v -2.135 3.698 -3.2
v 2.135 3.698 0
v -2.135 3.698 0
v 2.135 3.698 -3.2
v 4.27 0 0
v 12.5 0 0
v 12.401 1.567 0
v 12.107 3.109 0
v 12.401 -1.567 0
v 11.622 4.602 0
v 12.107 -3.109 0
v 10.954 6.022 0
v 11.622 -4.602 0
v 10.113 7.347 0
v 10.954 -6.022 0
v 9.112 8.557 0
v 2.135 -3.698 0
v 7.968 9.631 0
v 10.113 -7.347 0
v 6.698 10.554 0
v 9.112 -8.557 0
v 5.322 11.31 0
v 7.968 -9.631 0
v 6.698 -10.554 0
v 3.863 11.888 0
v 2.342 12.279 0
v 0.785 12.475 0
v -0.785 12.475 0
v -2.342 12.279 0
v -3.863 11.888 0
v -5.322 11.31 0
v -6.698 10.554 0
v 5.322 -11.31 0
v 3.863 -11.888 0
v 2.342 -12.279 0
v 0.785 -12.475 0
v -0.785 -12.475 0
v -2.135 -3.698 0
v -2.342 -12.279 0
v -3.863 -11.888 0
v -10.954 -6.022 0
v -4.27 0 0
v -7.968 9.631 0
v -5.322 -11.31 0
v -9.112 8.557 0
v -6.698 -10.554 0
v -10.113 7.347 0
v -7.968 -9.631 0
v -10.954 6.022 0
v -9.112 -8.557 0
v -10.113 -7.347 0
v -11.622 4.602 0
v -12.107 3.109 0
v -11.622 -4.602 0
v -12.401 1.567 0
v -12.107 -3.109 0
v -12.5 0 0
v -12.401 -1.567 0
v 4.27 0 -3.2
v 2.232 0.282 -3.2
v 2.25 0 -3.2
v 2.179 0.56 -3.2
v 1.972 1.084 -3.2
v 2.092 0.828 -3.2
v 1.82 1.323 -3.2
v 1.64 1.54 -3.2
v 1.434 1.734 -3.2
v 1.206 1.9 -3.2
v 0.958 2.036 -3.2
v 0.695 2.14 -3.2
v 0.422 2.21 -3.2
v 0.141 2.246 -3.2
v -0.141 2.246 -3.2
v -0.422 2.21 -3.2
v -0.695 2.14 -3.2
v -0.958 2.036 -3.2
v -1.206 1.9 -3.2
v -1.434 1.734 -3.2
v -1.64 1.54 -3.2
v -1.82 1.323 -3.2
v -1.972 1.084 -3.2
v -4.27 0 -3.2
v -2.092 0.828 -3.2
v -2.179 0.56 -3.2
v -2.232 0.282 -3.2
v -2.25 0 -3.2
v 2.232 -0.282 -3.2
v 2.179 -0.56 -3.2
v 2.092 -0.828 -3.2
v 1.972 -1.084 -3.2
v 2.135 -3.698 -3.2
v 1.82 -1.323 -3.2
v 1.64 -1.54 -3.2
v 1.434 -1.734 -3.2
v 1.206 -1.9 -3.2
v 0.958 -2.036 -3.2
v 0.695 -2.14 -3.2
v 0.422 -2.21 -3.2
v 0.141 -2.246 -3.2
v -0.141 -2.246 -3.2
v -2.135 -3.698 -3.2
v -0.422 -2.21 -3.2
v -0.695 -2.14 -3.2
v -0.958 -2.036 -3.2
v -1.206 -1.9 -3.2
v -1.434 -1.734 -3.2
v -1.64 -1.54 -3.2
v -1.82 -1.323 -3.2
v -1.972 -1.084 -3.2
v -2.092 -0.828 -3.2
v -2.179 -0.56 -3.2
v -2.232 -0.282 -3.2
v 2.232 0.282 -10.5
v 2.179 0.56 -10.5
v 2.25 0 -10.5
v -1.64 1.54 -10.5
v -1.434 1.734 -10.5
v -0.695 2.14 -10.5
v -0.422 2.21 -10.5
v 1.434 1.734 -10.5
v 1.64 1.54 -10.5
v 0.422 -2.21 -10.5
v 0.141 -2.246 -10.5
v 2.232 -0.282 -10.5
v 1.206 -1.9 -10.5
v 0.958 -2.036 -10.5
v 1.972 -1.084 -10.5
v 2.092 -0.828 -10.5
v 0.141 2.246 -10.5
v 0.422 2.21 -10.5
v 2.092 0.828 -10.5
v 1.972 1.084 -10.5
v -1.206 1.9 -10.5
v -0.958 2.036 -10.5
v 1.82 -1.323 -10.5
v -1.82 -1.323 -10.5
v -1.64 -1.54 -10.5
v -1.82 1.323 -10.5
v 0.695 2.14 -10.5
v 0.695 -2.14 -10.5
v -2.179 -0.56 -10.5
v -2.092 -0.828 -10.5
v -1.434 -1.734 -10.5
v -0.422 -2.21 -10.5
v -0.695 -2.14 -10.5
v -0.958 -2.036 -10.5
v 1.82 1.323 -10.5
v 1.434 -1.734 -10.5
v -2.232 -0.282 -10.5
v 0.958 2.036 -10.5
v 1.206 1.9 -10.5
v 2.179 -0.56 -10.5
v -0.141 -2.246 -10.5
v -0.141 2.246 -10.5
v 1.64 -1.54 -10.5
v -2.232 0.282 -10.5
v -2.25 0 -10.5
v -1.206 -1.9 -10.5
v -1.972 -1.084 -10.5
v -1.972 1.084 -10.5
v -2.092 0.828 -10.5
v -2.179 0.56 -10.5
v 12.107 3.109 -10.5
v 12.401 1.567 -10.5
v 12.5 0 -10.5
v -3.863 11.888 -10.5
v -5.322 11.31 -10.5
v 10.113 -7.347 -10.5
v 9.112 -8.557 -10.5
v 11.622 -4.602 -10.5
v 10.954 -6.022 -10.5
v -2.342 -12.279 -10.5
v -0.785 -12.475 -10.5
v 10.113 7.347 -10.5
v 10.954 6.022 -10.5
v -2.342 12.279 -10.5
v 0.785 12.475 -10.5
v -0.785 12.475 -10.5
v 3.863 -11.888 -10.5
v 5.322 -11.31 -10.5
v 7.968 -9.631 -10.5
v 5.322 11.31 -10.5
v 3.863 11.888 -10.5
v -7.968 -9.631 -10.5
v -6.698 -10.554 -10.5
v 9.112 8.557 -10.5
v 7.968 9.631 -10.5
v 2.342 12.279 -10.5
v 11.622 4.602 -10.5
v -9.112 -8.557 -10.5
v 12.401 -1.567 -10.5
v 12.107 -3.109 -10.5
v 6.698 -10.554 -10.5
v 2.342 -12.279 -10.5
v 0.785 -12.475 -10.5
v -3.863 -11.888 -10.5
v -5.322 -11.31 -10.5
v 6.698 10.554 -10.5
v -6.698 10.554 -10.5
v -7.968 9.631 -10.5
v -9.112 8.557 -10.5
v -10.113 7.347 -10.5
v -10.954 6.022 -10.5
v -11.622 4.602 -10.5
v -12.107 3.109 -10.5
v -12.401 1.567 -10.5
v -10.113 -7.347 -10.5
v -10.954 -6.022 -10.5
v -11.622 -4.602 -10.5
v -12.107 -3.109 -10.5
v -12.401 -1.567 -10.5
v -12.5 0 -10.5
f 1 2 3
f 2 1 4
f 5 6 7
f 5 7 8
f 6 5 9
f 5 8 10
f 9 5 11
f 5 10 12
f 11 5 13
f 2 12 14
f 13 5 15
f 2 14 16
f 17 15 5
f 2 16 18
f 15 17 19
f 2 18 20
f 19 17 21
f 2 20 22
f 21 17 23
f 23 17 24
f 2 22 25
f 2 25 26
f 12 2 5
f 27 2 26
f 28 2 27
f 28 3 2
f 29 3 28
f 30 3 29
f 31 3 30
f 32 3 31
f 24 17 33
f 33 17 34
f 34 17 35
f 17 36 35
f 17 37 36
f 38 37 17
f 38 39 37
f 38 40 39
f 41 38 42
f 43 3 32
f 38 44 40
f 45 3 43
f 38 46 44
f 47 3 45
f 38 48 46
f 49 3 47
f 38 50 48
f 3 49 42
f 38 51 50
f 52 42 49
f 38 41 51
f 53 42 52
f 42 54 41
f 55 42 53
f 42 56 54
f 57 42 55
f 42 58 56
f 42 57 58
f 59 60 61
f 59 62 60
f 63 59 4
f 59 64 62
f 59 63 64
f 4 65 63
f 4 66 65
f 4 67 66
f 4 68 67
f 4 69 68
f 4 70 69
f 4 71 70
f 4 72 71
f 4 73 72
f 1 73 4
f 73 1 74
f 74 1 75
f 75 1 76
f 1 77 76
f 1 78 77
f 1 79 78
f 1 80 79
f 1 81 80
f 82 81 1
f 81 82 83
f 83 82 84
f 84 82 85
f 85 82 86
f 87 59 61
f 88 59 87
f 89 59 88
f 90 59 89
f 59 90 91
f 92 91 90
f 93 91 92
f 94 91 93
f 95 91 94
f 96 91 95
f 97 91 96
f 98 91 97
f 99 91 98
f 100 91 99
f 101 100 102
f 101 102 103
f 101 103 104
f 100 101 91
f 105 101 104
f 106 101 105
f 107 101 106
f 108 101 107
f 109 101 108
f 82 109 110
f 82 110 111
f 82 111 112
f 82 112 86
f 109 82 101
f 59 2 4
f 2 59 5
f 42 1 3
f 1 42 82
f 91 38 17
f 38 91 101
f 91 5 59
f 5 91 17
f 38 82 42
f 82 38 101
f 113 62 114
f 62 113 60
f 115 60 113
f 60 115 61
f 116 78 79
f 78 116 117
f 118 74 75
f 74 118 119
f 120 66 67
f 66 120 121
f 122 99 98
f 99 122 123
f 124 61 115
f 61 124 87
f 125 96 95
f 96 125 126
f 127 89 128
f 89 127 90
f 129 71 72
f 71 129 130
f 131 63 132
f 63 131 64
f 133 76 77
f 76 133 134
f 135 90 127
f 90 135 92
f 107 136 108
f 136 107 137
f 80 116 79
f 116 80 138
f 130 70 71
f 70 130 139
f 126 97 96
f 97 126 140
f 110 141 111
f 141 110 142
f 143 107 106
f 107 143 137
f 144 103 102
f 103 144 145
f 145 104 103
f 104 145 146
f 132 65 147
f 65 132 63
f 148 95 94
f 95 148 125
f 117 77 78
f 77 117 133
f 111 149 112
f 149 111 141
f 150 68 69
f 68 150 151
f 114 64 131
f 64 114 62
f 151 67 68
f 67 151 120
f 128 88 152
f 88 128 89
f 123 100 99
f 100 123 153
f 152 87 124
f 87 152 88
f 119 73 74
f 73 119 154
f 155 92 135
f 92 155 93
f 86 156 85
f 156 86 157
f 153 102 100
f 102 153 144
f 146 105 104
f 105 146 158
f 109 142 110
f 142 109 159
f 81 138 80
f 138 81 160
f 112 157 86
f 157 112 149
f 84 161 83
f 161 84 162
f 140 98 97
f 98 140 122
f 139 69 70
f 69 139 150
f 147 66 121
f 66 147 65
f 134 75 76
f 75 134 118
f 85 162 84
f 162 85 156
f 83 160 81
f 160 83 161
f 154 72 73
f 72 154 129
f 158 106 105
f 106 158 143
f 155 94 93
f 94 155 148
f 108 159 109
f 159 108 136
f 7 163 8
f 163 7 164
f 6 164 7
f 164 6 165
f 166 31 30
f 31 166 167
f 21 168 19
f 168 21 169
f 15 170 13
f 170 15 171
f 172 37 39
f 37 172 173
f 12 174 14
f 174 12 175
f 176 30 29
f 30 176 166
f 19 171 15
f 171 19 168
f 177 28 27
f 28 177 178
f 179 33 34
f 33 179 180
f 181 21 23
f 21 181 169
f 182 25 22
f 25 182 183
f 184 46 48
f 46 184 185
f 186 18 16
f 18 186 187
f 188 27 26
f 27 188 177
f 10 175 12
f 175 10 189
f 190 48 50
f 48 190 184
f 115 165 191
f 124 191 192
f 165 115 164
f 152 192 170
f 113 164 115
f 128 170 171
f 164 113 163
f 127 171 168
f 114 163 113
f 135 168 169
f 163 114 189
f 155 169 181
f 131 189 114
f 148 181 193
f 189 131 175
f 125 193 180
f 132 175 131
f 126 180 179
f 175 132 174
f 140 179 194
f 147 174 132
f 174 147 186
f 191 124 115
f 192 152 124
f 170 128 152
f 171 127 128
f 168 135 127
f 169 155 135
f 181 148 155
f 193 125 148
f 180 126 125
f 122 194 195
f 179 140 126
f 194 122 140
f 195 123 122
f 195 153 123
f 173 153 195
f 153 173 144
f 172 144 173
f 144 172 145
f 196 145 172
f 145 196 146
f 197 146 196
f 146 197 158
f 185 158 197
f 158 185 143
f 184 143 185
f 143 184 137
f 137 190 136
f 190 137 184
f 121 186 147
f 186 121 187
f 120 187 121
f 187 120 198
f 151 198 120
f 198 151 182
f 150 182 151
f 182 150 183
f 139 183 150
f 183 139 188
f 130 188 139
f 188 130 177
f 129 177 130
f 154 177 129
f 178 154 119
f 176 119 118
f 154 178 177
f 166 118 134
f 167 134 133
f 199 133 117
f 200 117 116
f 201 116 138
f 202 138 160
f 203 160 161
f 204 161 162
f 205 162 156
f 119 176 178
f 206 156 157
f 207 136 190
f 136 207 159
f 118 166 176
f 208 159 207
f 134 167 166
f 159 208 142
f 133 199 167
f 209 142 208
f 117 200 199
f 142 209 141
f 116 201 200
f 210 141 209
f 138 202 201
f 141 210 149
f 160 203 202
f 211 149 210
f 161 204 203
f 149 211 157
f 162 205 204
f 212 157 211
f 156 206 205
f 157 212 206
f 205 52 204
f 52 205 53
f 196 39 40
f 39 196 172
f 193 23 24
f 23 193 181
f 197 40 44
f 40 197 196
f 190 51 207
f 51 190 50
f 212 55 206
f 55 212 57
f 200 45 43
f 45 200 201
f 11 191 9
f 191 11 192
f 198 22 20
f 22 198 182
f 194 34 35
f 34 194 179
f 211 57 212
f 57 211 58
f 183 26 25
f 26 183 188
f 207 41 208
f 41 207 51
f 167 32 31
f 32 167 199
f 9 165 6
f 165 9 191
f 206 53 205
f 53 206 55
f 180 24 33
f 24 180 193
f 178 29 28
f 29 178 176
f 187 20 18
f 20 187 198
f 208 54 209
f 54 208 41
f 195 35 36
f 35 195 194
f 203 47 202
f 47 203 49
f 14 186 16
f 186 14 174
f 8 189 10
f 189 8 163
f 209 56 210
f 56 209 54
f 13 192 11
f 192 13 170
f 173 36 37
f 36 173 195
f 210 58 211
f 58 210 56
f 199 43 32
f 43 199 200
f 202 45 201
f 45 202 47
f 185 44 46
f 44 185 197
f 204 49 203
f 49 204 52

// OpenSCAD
$fn = 50;


difference() {
	union() {
		translate(v = [0, 0, -10.5000000000]) {
			cylinder(h = 10.5000000000, r = 12.5000000000);
		}
	}
	union() {
		translate(v = [0, 0, 0]) {
			rotate(a = [0, 0, 0]) {
				difference() {
					union() {
						translate(v = [0, 0, -3.2000000000]) {
							linear_extrude(height = 3.2000000000) {
								polygon(points = [[4.2698000000, 0.0000000000], [2.1349000000, 3.6977552691], [-2.1349000000, 3.6977552691], [-4.2698000000, 0.0000000000], [-2.1349000000, -3.6977552691], [2.1349000000, -3.6977552691]]);
							}
						}
					}
					union();
				}
			}
		}
		#translate(v = [0, 0, -100.0000000000]) {
			cylinder(h = 200, r = 2.2500000000);
		}
	}
}
